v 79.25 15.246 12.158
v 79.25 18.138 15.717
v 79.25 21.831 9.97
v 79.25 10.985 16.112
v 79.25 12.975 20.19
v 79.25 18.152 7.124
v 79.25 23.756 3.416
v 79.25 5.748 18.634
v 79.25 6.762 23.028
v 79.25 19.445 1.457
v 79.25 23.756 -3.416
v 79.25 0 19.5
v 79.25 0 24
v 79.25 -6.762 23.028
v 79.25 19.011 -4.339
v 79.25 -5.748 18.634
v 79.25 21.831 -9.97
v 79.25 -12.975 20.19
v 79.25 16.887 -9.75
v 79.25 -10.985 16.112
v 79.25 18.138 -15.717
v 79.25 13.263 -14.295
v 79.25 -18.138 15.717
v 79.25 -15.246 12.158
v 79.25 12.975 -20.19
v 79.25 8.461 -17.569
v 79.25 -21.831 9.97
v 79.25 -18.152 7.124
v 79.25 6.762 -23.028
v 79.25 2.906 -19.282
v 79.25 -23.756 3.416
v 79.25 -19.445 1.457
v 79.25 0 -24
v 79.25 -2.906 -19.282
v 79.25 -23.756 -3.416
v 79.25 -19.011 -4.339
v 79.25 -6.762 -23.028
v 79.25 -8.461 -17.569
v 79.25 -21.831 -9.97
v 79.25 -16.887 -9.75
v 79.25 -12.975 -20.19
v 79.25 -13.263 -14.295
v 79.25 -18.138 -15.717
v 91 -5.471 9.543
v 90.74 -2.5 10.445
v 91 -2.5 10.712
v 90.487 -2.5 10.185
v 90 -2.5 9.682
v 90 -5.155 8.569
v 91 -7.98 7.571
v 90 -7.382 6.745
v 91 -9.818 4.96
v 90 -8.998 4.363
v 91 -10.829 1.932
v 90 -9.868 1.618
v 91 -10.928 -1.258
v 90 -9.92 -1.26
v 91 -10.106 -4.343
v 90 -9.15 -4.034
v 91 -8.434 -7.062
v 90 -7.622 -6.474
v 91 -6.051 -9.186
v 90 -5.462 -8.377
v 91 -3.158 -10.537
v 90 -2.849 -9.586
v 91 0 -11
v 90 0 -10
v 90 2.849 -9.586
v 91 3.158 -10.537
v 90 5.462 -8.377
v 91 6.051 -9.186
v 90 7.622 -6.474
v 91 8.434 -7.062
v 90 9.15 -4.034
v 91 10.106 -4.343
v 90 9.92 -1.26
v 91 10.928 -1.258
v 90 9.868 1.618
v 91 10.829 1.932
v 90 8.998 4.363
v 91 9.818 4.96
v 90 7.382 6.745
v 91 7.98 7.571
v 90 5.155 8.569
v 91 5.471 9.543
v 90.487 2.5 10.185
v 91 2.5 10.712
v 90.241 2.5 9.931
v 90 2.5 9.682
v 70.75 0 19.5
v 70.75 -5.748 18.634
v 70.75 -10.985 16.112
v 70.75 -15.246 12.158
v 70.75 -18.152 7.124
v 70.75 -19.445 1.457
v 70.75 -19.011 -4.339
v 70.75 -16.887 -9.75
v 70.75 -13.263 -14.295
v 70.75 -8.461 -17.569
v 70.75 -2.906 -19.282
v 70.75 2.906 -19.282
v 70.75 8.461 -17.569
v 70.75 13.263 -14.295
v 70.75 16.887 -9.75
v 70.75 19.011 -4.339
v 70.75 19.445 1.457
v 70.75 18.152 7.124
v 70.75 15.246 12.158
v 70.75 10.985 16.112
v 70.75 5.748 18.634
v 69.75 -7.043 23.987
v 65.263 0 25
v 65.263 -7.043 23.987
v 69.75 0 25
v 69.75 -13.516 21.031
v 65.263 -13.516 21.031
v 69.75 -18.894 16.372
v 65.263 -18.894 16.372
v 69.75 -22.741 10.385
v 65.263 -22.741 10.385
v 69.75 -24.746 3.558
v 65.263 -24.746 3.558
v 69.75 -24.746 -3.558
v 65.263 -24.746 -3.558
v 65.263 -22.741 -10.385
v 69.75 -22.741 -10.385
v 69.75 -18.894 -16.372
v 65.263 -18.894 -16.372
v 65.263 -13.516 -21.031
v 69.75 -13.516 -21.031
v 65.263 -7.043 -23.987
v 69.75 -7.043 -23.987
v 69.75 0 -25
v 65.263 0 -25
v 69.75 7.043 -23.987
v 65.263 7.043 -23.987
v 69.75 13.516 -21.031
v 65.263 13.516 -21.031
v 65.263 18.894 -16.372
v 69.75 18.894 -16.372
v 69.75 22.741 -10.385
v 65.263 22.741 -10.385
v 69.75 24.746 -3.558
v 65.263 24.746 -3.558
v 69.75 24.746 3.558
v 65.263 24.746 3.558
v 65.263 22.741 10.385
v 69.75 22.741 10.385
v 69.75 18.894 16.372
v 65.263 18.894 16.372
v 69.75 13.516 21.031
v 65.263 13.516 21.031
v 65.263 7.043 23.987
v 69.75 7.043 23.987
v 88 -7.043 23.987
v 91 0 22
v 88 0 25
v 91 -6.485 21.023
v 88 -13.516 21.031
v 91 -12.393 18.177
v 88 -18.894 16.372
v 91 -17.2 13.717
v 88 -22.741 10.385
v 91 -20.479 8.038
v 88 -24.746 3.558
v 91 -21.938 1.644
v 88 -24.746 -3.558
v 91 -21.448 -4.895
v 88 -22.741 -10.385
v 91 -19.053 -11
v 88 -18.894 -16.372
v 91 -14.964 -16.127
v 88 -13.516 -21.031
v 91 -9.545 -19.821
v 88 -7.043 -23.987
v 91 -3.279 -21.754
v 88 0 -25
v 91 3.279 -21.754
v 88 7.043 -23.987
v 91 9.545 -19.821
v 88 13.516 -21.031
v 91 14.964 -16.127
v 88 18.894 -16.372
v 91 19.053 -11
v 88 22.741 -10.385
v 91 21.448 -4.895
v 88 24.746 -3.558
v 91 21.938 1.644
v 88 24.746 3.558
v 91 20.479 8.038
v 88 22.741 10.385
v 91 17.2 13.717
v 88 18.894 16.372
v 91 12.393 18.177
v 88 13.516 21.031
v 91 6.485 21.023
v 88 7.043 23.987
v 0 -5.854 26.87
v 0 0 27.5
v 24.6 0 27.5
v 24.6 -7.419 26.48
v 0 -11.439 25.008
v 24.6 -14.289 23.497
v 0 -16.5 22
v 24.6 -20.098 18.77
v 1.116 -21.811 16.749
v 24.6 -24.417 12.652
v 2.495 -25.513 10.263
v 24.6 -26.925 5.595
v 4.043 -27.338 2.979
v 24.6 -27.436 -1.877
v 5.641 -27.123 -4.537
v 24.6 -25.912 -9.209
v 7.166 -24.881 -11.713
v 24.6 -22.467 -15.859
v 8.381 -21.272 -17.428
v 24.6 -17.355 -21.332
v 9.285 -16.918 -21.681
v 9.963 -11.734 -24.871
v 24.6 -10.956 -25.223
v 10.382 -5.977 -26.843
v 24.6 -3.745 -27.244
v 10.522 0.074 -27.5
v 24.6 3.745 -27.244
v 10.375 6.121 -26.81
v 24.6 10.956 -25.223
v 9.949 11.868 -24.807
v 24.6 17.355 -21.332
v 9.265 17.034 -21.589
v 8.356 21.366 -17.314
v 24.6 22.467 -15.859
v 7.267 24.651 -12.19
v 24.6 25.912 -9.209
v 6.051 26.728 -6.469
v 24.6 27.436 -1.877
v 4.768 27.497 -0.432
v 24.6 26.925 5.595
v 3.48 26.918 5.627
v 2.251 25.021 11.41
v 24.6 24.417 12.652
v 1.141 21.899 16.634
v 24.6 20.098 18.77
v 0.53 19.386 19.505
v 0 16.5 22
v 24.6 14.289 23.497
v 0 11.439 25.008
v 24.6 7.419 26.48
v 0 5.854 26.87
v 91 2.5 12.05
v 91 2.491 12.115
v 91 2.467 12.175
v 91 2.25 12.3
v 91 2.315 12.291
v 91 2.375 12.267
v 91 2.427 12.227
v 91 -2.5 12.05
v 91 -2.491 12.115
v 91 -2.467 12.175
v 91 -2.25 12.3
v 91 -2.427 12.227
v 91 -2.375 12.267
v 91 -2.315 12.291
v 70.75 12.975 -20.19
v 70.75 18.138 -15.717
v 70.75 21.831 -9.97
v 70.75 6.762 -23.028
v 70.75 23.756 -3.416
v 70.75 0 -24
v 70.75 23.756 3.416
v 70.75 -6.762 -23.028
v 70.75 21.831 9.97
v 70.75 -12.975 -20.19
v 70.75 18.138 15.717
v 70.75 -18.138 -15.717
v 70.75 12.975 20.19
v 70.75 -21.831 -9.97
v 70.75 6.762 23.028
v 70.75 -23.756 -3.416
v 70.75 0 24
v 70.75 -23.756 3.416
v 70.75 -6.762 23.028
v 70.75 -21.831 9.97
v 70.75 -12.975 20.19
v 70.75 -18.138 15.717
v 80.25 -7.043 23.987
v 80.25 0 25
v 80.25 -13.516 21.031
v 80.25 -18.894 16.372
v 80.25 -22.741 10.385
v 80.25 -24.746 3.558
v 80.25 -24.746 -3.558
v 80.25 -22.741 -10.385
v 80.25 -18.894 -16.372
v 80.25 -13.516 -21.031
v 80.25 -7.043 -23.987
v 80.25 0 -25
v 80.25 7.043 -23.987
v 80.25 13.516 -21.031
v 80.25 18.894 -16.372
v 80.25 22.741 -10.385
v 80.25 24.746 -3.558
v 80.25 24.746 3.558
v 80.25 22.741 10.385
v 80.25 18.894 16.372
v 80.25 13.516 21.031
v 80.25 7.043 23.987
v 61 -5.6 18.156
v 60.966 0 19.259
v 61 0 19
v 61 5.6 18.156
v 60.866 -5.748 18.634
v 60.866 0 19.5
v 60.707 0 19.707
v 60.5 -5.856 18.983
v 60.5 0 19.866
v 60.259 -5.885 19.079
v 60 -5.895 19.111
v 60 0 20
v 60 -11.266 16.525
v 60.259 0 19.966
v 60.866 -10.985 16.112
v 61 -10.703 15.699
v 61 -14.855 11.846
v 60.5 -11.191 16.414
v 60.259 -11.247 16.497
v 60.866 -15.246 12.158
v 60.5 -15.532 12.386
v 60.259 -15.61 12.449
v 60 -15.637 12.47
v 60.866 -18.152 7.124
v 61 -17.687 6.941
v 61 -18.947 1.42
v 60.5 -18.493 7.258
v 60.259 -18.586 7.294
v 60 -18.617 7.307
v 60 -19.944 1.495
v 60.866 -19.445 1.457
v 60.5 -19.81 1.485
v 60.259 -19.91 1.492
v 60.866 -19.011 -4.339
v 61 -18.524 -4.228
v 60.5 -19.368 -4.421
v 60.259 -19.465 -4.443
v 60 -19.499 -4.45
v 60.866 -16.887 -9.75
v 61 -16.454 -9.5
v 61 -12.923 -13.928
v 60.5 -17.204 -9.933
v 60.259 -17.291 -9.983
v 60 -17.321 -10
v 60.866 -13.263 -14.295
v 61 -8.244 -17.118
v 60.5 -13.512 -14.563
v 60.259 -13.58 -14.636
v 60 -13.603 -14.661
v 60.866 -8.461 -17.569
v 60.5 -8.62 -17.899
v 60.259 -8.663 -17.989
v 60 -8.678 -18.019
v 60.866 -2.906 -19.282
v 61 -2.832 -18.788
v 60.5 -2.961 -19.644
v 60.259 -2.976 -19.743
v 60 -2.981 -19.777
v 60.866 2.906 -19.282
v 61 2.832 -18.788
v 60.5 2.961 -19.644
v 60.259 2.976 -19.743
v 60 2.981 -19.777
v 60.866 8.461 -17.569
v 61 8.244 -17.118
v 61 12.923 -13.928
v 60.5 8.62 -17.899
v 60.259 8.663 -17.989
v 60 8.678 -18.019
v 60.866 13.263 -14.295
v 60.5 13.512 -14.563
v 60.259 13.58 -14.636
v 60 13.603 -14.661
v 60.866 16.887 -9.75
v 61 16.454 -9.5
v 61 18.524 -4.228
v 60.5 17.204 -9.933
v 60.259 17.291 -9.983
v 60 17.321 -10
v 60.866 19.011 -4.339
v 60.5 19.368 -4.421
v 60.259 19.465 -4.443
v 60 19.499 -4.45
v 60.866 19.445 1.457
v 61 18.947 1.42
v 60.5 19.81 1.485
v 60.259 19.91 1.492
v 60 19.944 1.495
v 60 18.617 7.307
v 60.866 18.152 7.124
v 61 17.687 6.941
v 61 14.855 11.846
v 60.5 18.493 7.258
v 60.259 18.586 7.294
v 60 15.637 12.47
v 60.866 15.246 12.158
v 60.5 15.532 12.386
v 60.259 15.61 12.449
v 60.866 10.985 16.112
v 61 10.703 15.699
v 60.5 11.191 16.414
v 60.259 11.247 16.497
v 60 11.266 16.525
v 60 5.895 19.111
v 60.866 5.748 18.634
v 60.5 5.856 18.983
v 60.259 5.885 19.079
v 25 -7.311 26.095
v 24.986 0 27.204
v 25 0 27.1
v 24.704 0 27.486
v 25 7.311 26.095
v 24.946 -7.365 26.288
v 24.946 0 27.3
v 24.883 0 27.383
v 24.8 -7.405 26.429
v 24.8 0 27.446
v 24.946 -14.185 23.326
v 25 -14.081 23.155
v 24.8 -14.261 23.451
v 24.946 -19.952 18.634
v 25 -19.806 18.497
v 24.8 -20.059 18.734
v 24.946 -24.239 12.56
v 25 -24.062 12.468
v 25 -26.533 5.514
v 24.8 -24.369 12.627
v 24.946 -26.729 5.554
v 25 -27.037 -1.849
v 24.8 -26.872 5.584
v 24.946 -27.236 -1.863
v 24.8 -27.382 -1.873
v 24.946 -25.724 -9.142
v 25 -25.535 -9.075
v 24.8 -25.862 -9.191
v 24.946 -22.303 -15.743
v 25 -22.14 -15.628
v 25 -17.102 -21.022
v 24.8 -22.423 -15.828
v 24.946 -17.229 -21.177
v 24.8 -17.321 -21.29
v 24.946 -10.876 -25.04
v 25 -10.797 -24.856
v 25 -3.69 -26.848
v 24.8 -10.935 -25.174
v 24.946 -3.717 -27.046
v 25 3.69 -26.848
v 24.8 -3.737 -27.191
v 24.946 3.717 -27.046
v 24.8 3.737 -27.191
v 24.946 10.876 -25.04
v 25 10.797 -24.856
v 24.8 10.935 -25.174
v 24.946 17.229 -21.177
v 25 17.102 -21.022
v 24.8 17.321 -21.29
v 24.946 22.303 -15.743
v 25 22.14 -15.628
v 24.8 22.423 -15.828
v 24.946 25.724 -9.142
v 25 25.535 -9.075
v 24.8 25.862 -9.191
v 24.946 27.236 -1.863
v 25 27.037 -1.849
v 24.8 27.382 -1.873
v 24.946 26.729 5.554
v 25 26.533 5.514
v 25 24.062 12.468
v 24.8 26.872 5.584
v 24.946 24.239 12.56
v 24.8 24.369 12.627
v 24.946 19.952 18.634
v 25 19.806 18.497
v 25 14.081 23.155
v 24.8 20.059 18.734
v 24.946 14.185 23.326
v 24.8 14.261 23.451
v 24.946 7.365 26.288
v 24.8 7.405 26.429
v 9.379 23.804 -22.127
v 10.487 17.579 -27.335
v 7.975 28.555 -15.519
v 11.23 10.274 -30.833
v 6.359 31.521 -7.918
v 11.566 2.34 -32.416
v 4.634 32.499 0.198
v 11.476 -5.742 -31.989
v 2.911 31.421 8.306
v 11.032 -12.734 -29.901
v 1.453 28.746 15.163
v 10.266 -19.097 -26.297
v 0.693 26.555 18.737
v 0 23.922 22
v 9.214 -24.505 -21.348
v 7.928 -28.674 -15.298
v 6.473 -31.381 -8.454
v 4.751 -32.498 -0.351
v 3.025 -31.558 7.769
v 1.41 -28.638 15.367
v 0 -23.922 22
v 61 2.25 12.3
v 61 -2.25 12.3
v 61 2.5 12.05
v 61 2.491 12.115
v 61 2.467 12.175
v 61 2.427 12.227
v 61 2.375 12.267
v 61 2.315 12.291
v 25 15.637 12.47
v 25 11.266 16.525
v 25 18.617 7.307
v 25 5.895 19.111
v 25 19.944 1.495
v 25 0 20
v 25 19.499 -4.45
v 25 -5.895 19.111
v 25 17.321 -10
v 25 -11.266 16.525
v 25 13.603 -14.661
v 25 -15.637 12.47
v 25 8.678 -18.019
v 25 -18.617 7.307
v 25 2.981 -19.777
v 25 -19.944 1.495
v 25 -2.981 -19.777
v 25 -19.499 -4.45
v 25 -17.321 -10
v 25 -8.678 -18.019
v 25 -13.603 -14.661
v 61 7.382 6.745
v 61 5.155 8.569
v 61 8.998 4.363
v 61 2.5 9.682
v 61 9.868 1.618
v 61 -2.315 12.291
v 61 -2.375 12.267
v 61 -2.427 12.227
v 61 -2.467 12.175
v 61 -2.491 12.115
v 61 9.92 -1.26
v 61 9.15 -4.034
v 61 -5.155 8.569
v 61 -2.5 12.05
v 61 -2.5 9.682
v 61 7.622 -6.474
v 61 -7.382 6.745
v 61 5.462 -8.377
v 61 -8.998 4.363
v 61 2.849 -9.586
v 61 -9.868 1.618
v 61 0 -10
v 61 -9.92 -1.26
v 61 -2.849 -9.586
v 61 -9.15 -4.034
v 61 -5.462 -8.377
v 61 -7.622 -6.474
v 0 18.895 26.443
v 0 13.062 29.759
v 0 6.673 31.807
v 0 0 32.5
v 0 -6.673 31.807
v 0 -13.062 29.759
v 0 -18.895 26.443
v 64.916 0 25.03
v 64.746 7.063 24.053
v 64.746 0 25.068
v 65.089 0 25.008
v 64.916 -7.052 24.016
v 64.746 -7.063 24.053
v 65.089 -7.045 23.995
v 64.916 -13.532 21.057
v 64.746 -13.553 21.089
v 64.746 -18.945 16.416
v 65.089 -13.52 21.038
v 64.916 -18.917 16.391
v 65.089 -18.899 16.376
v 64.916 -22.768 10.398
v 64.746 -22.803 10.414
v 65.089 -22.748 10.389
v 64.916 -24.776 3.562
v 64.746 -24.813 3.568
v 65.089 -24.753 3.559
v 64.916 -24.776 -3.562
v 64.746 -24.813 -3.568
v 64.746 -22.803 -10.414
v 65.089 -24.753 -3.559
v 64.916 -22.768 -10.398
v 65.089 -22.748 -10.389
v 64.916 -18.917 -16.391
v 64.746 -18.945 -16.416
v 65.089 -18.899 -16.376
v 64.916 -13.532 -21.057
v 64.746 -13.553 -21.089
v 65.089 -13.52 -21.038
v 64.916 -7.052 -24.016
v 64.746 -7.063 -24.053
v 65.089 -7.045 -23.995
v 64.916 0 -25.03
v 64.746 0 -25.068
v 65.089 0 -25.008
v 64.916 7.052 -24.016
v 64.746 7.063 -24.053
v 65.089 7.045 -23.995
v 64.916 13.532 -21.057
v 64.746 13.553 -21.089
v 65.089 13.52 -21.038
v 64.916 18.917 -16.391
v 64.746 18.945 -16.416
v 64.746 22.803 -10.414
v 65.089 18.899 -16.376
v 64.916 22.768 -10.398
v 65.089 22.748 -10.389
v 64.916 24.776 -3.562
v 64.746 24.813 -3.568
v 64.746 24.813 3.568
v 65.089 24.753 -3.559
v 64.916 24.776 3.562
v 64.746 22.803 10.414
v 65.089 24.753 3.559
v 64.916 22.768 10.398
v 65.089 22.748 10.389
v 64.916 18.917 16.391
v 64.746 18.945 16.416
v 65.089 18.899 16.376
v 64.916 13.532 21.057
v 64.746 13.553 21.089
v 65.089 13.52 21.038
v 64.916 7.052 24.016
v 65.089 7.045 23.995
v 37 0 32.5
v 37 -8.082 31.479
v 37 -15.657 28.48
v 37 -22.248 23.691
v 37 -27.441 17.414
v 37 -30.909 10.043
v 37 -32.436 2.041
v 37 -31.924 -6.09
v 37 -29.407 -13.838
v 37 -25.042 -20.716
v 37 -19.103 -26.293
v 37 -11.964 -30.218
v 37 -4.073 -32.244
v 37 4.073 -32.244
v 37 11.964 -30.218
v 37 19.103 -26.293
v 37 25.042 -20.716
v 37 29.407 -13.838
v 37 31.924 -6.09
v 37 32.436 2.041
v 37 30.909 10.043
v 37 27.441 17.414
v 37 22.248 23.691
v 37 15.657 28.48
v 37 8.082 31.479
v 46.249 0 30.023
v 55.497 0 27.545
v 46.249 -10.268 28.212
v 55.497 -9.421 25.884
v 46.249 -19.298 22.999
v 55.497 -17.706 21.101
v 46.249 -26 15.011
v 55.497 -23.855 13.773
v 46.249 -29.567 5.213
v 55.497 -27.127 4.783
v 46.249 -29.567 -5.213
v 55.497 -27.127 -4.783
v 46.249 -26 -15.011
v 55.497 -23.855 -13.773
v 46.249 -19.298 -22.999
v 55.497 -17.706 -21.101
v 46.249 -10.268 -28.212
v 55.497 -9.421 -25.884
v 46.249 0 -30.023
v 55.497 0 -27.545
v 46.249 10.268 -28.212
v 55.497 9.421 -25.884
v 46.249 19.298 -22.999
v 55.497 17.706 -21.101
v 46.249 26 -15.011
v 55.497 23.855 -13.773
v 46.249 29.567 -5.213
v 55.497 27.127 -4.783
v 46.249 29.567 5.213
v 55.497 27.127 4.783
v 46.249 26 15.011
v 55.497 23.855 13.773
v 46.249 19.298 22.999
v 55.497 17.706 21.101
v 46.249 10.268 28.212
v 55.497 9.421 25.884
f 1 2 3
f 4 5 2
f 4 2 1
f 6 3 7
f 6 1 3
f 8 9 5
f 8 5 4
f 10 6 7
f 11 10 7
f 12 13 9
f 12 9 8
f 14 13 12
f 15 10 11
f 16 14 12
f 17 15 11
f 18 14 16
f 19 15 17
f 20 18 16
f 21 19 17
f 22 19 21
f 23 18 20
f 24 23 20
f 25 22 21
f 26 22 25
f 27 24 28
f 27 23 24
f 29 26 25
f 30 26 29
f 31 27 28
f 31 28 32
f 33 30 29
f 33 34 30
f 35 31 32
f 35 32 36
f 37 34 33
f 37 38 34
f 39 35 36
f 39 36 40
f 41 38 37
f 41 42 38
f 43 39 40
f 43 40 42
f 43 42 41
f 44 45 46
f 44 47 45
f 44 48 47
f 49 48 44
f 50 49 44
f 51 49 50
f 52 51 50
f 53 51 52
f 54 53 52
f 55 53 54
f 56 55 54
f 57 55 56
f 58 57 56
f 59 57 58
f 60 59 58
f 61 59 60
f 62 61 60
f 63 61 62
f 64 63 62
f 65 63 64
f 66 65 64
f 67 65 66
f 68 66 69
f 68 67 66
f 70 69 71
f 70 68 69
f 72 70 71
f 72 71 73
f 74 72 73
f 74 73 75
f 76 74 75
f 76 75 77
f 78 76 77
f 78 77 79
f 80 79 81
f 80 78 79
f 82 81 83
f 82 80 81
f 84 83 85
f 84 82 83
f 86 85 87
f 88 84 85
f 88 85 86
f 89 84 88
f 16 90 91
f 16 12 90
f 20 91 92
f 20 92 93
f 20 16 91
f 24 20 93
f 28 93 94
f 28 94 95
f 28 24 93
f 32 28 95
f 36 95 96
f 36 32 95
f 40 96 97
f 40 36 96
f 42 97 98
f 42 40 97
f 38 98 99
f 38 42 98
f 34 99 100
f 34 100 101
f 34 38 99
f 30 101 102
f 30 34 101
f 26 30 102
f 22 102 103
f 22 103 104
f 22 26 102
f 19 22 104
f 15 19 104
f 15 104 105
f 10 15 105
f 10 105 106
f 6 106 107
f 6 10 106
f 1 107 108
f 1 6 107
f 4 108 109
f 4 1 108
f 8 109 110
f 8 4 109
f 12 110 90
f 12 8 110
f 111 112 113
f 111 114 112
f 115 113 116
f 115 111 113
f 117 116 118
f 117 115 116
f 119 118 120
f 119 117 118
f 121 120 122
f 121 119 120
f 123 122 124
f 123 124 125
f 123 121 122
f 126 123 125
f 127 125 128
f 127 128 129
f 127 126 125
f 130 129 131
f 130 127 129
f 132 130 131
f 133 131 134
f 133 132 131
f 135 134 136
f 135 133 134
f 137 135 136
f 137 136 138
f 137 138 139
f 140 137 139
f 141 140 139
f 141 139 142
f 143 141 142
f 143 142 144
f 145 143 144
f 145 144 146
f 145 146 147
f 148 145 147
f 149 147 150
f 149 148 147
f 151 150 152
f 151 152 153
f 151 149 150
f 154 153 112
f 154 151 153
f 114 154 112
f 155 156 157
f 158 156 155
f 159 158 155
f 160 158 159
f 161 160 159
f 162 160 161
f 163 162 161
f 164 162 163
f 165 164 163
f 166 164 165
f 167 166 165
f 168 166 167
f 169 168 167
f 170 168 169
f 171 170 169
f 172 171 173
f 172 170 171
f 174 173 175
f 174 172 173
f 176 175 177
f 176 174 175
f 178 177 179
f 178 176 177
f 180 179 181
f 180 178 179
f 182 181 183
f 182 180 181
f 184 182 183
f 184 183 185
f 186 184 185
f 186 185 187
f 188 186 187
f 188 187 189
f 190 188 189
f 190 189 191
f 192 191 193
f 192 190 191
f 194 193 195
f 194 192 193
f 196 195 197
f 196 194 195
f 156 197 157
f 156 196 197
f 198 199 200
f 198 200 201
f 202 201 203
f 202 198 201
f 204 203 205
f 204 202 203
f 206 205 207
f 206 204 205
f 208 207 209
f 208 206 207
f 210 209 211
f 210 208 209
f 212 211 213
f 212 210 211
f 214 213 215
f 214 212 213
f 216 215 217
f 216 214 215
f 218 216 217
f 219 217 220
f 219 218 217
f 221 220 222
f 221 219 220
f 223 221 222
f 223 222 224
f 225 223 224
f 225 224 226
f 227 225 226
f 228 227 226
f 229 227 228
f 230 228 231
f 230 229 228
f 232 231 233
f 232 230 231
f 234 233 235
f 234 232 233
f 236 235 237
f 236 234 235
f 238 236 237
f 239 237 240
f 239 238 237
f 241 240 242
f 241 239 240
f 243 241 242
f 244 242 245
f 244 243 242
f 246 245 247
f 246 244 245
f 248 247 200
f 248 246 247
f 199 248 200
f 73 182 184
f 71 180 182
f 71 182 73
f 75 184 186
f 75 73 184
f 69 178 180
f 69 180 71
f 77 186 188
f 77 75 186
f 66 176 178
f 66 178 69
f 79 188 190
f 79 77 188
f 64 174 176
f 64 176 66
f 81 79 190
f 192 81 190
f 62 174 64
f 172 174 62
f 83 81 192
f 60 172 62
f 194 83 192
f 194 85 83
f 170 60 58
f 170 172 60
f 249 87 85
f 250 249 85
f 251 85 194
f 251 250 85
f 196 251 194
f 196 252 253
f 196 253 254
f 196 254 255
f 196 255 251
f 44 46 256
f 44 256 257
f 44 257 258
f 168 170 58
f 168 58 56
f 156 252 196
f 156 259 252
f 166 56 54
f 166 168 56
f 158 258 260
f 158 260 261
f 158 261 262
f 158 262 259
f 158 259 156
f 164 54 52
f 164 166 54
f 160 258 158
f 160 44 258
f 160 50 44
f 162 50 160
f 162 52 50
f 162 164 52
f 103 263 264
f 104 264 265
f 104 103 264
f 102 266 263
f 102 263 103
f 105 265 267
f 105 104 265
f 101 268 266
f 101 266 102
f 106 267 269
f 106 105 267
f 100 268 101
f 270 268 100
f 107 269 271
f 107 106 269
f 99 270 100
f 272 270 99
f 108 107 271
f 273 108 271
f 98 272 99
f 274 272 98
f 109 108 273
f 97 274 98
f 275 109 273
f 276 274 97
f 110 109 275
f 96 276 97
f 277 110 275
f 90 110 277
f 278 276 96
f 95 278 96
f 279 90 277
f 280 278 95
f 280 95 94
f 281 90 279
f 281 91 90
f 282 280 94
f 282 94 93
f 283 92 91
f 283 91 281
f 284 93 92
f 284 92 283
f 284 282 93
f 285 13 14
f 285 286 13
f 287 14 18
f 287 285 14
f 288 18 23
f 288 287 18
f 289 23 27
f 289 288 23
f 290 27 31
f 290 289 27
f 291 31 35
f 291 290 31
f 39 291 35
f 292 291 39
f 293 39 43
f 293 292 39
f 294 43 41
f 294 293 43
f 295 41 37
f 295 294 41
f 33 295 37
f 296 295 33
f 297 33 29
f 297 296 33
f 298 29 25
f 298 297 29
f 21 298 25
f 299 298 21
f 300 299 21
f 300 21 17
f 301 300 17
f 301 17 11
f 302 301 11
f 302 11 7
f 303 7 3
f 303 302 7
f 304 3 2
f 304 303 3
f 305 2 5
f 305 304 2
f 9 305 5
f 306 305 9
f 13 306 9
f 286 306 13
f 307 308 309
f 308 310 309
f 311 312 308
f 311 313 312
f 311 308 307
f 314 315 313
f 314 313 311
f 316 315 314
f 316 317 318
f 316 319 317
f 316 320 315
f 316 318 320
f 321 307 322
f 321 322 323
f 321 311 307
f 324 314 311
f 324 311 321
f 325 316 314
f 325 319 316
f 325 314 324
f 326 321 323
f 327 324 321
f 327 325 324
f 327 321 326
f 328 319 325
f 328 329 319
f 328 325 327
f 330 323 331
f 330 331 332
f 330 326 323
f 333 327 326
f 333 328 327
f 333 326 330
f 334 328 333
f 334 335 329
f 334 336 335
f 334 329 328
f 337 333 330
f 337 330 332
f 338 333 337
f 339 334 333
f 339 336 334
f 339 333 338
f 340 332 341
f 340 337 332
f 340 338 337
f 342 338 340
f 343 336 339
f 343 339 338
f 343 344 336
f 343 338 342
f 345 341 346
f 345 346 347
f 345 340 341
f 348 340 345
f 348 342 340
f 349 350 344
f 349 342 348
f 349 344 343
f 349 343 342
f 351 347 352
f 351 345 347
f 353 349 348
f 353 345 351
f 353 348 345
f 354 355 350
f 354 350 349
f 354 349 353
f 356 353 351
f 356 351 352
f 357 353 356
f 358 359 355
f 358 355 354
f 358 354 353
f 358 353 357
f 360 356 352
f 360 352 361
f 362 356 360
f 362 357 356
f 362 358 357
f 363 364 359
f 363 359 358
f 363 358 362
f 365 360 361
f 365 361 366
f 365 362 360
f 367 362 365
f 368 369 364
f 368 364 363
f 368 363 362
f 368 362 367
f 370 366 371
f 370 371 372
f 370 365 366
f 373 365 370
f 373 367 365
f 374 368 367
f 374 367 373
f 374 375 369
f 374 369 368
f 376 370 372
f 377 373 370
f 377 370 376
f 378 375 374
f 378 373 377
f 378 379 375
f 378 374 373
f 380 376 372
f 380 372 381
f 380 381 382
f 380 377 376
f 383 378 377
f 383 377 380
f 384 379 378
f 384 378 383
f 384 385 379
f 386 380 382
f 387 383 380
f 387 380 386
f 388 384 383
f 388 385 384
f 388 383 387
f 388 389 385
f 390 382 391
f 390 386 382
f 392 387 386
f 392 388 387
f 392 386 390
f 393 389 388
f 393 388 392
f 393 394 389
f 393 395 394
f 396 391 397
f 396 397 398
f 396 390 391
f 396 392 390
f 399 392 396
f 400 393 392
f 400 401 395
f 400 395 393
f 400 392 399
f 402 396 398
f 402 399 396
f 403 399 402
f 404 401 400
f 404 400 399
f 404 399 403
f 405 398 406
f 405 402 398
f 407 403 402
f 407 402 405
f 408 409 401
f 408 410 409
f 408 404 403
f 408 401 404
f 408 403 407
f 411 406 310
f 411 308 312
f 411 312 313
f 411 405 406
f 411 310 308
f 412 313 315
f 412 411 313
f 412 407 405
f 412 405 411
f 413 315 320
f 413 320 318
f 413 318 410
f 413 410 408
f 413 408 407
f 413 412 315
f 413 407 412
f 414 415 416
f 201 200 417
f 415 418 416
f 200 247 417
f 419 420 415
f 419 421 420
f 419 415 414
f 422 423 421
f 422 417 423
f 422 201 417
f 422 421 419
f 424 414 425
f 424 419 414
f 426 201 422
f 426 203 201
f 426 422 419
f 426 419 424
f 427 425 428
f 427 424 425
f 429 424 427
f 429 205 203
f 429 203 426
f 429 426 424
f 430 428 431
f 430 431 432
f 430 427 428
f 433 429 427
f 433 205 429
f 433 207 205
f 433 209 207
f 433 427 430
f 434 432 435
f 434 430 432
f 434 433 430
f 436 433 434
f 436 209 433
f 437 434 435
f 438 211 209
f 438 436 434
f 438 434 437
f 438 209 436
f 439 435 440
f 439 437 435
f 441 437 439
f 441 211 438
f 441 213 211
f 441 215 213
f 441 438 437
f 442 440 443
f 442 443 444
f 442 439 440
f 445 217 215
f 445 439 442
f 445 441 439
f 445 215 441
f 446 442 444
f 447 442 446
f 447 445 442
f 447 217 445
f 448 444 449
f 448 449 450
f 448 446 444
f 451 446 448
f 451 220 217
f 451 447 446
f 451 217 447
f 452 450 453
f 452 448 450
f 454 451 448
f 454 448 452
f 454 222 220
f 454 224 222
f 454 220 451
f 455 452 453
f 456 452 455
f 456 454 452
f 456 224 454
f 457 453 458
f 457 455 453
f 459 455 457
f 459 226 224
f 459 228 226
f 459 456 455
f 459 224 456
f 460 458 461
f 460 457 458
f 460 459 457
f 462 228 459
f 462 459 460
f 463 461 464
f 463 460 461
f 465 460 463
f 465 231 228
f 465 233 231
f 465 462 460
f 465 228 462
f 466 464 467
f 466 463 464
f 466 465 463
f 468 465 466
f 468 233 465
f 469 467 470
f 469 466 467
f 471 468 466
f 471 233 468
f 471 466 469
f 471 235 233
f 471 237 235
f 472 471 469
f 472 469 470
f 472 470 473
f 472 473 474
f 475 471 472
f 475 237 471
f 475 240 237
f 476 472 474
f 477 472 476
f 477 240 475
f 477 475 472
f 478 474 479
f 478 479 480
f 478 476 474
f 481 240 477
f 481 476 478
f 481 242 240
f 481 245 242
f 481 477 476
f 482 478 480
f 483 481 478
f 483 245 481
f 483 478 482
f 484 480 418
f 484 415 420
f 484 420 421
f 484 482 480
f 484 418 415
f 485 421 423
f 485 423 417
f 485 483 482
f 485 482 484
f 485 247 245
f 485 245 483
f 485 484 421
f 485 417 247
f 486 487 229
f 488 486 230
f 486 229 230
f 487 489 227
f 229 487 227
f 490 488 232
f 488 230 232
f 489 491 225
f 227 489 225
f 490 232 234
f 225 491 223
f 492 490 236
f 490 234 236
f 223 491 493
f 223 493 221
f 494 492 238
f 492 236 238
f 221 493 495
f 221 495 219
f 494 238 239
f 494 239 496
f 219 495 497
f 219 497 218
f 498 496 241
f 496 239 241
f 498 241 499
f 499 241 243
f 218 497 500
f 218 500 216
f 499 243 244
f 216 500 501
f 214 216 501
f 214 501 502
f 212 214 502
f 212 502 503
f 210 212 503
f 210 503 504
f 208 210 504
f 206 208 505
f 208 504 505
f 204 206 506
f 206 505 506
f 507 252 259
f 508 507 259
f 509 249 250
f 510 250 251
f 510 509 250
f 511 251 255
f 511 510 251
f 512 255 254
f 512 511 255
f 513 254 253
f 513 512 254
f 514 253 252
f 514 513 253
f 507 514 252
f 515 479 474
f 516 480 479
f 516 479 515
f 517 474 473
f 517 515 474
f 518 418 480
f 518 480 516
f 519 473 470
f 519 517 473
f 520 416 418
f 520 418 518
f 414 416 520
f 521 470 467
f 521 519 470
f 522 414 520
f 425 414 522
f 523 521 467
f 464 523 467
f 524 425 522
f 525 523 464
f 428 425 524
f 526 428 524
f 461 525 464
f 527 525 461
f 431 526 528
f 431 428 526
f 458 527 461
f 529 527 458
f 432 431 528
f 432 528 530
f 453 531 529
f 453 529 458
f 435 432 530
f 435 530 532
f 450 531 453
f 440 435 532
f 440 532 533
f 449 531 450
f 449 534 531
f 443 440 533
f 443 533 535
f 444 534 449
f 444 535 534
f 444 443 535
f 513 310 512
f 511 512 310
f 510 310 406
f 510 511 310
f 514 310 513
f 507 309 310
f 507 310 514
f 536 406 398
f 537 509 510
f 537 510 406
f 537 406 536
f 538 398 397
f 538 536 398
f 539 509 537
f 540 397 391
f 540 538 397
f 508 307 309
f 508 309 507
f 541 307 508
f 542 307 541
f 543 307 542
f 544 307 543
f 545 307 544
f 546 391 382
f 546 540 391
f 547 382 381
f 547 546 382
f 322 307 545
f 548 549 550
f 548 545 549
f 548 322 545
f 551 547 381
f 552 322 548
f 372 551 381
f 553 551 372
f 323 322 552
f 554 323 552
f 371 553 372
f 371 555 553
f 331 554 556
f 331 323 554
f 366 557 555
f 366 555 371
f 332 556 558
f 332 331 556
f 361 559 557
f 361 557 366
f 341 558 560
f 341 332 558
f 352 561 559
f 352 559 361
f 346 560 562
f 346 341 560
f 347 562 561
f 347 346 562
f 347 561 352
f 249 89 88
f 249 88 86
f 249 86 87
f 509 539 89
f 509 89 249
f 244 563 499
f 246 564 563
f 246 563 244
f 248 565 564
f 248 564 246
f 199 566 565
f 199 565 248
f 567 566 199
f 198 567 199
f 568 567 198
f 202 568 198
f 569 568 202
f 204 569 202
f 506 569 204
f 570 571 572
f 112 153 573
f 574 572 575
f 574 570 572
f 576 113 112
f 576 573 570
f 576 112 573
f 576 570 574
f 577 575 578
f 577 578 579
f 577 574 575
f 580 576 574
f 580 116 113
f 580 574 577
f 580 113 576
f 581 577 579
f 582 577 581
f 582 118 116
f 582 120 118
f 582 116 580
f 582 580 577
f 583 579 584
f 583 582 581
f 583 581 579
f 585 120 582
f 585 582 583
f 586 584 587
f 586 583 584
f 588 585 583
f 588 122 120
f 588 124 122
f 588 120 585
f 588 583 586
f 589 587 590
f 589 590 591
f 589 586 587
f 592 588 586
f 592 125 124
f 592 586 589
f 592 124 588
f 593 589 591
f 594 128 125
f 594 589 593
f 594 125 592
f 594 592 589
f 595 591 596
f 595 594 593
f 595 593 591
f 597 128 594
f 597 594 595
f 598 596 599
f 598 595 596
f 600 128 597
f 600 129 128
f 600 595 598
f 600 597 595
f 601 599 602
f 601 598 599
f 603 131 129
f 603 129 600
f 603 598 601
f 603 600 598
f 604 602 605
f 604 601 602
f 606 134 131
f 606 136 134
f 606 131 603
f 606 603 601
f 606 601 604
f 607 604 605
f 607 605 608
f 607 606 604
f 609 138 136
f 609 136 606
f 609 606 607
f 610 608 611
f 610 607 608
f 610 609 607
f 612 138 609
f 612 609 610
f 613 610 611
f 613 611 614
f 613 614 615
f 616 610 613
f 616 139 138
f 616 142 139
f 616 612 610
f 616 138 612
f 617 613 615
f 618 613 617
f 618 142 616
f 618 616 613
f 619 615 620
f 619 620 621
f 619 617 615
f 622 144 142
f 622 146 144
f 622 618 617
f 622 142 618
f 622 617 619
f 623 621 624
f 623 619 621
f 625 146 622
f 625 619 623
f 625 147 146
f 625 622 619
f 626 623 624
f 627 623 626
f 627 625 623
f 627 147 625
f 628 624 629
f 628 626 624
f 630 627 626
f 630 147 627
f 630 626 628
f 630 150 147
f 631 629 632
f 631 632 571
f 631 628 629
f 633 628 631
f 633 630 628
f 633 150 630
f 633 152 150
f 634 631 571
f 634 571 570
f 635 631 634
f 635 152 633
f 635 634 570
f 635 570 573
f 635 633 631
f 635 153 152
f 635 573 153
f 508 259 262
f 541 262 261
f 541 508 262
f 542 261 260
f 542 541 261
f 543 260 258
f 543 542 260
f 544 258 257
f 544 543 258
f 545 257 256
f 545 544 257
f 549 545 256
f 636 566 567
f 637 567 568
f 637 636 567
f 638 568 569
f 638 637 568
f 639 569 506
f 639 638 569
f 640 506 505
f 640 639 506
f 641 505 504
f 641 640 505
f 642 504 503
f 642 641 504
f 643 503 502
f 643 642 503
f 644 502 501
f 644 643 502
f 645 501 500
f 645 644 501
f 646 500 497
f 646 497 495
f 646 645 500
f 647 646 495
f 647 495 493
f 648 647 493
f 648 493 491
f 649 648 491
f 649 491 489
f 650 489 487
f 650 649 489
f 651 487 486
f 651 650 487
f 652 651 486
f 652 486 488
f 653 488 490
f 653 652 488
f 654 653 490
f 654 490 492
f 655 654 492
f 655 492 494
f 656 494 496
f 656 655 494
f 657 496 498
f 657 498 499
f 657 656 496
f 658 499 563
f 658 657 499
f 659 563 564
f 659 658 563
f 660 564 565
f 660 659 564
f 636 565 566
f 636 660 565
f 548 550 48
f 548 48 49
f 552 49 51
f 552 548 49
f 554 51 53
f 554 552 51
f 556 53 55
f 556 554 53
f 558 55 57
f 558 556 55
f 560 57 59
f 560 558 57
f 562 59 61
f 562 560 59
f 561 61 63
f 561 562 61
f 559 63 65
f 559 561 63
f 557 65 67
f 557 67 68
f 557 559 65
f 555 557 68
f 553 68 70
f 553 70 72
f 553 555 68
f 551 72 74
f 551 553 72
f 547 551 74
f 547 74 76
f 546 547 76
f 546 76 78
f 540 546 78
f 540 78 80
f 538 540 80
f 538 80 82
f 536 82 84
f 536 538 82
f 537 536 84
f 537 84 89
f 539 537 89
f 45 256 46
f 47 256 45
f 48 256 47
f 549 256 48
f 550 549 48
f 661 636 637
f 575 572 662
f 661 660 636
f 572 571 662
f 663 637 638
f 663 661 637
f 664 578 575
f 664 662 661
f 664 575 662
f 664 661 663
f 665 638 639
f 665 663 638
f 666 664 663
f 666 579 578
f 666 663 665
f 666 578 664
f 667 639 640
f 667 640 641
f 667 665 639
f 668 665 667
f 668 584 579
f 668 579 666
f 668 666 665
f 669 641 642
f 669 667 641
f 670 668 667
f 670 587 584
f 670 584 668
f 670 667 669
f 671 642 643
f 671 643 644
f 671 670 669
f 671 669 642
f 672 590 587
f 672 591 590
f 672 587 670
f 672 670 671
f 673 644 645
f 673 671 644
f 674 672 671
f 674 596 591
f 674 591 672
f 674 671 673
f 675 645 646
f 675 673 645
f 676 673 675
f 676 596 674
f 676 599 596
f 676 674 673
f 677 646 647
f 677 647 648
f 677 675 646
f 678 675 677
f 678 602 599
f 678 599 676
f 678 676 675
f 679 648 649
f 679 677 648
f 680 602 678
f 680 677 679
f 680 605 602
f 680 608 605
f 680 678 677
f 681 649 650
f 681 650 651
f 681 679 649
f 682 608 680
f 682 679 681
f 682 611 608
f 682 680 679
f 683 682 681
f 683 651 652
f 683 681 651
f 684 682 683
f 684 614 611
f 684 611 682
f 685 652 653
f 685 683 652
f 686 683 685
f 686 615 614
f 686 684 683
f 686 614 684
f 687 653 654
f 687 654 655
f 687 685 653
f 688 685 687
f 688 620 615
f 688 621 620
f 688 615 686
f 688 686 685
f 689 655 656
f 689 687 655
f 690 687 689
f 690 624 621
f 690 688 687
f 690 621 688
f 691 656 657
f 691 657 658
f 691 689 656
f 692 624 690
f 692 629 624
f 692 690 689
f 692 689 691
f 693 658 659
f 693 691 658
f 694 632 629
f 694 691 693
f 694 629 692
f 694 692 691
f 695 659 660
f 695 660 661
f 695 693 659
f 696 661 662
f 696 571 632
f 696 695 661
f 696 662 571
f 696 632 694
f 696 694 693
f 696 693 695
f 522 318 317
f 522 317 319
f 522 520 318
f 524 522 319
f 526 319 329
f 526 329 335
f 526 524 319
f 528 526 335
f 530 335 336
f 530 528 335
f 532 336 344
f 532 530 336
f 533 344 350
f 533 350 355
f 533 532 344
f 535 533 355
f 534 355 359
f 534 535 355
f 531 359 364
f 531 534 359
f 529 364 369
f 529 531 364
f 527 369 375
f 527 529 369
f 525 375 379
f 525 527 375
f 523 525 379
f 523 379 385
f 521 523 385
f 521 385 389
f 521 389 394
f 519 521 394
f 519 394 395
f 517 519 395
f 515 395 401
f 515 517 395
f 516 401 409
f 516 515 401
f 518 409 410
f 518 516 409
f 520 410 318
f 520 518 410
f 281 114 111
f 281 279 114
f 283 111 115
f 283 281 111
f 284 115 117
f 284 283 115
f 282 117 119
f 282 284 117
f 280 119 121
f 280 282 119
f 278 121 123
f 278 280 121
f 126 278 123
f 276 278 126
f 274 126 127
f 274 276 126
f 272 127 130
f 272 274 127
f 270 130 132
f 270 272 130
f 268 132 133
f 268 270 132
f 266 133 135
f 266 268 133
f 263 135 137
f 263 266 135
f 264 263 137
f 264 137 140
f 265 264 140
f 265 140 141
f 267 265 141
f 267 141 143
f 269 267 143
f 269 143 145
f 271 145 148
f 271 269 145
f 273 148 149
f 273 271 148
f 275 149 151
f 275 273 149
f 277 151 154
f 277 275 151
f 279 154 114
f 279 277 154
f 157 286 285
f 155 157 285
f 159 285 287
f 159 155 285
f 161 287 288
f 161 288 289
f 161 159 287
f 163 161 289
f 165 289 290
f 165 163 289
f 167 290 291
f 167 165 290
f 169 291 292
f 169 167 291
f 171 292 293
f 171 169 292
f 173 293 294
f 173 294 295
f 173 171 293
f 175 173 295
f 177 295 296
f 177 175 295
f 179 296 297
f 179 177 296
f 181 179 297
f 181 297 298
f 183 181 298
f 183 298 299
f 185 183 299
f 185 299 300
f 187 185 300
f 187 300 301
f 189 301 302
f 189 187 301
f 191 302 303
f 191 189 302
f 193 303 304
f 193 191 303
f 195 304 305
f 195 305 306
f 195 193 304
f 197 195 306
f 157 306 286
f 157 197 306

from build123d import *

# Parameters (mm, degrees)
CUT_EXTRUDE_12_DEPTH      = 102.948516419
CUT_EXTRUDE_12_DEPTH_BACK = 102.948516419
CUT_EXTRUDE_START         = 61
CUT_EXTRUDE_5_R0_25_DEPTH = 31


with BuildPart() as part:
    # Эскиз1 → Revolve 238 (revolve)
    with BuildSketch(Plane.XY, mode=Mode.PRIVATE) as revolve_238_sk:
        with BuildLine():
            Line((0, 32.5), (37, 32.5))
            Line((37, 32.5), (64.745695, 25.068113))
            ThreePointArc((64.745695, 25.068113), (65.002224223, 25.017098236), (65.263217049, 24.999995817))
            Line((65.263217049, 24.999995817), (69.749999449, 24.999995817))
            Line((69.749999449, 24.999995817), (70.749999449, 23.999995817))
            Line((70.749999449, 23.999995817), (70.749999449, 19.499995817))
            Line((70.749999449, 19.499995817), (79.25, 19.499995817))
            Line((79.25, 19.499995817), (79.25, 24))
            Line((79.25, 24), (80.25, 25))
            Line((80.25, 25), (88, 25))
            Line((88, 25), (91, 22))
            Line((91, 22), (91, 11))
            Line((91, 11), (90, 10))
            Line((90, 10), (61, 10))
            Line((61, 10), (61, 19))
            ThreePointArc((61, 19), (60.707106781, 19.707106781), (60, 20))
            Line((60, 20), (25, 20))
            Line((25, 20), (25, 27.1))
            ThreePointArc((25, 27.1), (24.882842712, 27.382842712), (24.6, 27.5))
            Line((24.6, 27.5), (0, 27.5))
            Line((0, 27.5), (0, 32.5))
        make_face()
    revolve(revolve_238_sk.sketch.rotate(Axis((0, 0, 0), (1, 0, 0)), 90), axis=Axis((0, 0, 0), (1, 0, 0)))

    # Эскиз2 → Наклон торца 12 градусов (cut, two sides: drawn at the far end of the back side and taken through both)
    with BuildSketch(Plane(origin=(0, 0, 0), x_dir=(1, 0, 0), z_dir=(0, 1, 0)).offset(-CUT_EXTRUDE_12_DEPTH_BACK)):
        Polygon((-25, 50), (15.30407244, 50), (-5.951583727, -50), (-25, -50), align=None)
    extrude(amount=CUT_EXTRUDE_12_DEPTH + CUT_EXTRUDE_12_DEPTH_BACK, mode=Mode.SUBTRACT)

    # Эскиз3 → Паз 5 R0.25 (cut)
    with BuildSketch(Plane(origin=(0, 0, 0), x_dir=(0, 0, -1), z_dir=(1, 0, 0)).offset(CUT_EXTRUDE_START)):
        with BuildLine():
            Line((0, -2.5), (0, 2.5))
            Line((0, 2.5), (-12.05, 2.5))
            ThreePointArc((-12.05, 2.5), (-12.226776695, 2.426776695), (-12.3, 2.25))
            Line((-12.3, 2.25), (-12.3, -2.25))
            ThreePointArc((-12.3, -2.25), (-12.226776695, -2.426776695), (-12.05, -2.5))
            Line((-12.05, -2.5), (0, -2.5))
        make_face()
    extrude(amount=CUT_EXTRUDE_5_R0_25_DEPTH, mode=Mode.SUBTRACT)


solid = part.part
